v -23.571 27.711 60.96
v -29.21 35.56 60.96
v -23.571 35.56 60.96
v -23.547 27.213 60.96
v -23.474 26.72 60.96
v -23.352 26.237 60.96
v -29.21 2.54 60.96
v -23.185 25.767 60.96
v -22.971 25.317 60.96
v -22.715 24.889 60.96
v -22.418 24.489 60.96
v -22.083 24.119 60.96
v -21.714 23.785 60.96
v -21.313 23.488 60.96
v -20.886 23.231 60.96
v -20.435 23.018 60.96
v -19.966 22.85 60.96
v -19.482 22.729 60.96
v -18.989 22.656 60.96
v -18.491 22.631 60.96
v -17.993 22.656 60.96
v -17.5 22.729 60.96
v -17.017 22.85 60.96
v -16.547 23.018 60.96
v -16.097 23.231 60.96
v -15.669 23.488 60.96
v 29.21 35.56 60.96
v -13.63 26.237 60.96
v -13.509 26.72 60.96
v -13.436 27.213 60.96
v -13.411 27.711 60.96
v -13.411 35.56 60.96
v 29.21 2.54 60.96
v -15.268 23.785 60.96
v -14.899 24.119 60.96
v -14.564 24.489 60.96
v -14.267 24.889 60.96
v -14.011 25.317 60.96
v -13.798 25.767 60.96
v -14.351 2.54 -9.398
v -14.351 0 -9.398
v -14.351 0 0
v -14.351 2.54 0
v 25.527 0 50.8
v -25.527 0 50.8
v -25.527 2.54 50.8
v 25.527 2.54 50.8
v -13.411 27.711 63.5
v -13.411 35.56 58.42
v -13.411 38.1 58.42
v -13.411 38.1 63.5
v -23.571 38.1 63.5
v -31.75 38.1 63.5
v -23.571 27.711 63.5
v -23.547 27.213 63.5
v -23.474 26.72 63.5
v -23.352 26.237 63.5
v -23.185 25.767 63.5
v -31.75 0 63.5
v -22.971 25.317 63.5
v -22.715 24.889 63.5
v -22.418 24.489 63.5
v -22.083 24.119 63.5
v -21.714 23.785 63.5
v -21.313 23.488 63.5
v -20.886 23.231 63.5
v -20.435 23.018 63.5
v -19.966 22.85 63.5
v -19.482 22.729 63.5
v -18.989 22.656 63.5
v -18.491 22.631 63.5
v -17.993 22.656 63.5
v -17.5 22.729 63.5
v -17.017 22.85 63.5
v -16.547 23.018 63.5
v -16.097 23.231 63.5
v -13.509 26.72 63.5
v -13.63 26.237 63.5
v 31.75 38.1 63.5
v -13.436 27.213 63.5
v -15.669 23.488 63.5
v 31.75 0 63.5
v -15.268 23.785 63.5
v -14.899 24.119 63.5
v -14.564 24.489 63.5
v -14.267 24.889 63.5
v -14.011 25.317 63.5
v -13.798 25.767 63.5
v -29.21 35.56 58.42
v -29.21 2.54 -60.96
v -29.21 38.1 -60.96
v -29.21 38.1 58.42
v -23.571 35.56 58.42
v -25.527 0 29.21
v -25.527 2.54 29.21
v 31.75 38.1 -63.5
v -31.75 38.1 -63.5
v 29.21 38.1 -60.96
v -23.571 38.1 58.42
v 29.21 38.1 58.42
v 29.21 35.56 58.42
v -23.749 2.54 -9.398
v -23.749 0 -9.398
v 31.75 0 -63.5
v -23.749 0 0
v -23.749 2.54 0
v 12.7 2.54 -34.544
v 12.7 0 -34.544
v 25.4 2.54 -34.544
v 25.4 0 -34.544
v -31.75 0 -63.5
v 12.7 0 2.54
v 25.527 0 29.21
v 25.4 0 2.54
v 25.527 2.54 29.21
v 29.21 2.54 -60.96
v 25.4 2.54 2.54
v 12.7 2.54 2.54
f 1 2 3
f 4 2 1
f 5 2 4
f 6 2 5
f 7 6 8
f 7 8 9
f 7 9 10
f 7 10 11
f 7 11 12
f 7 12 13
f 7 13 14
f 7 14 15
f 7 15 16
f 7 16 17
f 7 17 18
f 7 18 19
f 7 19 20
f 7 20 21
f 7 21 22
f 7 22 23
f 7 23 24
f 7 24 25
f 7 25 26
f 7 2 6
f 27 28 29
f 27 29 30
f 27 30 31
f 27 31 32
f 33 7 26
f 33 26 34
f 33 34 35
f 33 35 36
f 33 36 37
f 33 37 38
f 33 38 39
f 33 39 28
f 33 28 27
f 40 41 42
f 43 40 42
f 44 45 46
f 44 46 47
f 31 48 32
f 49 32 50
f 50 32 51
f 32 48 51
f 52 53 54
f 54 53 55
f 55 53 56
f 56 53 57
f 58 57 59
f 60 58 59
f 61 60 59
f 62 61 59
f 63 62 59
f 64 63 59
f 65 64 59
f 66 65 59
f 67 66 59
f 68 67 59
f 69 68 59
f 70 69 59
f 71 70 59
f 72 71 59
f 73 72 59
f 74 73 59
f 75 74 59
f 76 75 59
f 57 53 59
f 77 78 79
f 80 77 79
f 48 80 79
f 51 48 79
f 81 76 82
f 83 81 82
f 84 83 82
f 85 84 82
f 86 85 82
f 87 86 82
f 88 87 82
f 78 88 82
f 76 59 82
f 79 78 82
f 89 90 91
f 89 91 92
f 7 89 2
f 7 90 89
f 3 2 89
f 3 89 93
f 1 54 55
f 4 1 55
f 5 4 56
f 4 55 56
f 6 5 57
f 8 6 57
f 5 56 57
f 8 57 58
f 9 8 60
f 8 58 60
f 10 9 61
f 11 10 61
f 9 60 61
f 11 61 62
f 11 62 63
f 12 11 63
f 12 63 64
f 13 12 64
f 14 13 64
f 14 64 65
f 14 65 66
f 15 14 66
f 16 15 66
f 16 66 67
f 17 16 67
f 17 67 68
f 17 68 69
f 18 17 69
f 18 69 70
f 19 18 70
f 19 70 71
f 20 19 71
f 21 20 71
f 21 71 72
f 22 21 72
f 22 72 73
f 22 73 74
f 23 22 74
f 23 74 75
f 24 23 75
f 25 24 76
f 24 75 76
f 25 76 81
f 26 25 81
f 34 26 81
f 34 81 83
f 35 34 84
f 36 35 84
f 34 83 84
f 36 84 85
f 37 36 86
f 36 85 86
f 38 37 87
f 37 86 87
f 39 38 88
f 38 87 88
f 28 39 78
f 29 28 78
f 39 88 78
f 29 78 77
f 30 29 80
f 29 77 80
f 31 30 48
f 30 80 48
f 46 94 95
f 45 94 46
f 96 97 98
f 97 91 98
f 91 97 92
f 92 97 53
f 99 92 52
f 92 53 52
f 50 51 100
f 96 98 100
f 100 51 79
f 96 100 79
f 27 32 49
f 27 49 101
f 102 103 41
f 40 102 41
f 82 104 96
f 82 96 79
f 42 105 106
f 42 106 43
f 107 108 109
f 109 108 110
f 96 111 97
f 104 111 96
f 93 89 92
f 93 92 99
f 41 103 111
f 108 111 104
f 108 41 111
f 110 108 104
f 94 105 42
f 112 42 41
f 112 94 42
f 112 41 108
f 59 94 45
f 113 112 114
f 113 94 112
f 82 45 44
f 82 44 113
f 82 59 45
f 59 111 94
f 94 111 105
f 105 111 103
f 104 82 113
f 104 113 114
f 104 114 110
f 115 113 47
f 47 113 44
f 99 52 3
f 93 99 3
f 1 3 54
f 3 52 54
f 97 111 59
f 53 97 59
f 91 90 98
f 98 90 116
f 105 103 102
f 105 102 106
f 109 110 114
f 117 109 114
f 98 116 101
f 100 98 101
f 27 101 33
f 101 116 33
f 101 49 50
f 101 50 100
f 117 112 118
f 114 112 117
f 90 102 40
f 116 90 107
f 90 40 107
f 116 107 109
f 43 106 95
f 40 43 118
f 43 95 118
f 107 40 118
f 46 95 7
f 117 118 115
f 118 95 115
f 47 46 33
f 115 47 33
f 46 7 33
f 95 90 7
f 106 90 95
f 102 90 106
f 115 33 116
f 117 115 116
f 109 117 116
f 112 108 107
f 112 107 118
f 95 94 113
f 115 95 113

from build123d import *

# Parameters (mm, degrees)
F0_W     = 63.5
F0_H     = 127
F0_W_2   = 58.42
F0_H_2   = 121.92
F0_W_3   = 9.398
F0_H_3   = 9.398
F0_W_4   = 12.7
F0_H_4   = 37.084
F0_W_5   = 51.054
F0_H_5   = 21.59
F1_DEPTH = 2.54
F2_DEPTH = 38.1
F3_W     = 58.42
F3_H     = 2.54
F4_DEPTH = 2.54
F6_DEPTH = 12.0904


with BuildPart() as f1:
    # F0 (on Front) → F1 (new body)
    with BuildSketch(Plane.XZ):
        Rectangle(F0_W, F0_H)
        Rectangle(F0_W_2, F0_H_2, mode=Mode.SUBTRACT)
        Rectangle(F0_W_2, F0_H_2)
        with Locations((-19.05, -4.699)):
            Rectangle(F0_W_3, F0_H_3, mode=Mode.SUBTRACT)
        with Locations((19.05, -16.002)):
            Rectangle(F0_W_4, F0_H_4, mode=Mode.SUBTRACT)
        with Locations((0, 40.005)):
            Rectangle(F0_W_5, F0_H_5, mode=Mode.SUBTRACT)
    extrude(amount=-F1_DEPTH)

    # F0 (on Front) → F2 (join)
    with BuildSketch(Plane.XZ):
        Rectangle(F0_W, F0_H)
        Rectangle(F0_W_2, F0_H_2, mode=Mode.SUBTRACT)
    extrude(amount=-F2_DEPTH)

    # F3 (on face) → F4 (join)
    with BuildSketch(Plane(origin=(0, 0, 60.96), x_dir=(1, 0, 0), z_dir=(0, 0, -1))):
        with Locations((0, -36.83)):
            Rectangle(F3_W, F3_H)
    extrude(amount=F4_DEPTH)

    # F5 (on face) → F6 (cut)
    with BuildSketch(Plane.XY.offset(63.5)):
        with BuildLine():
            ThreePointArc((-23.5712, 27.7114), (-18.4912, 22.6314), (-13.4112, 27.7114))
            ThreePointArc((-13.4112, 27.7114), (-18.4912, 32.7914), (-23.5712, 27.7114))
        make_face()
        with BuildLine():
            ThreePointArc((-23.5712, 27.7114), (-18.4912, 32.7914), (-13.4112, 27.7114))
            Line((-13.4112, 27.7114), (-13.4112, 38.1))
            Line((-13.4112, 38.1), (-23.5712, 38.1))
            Line((-23.5712, 38.1), (-23.5712, 27.7114))
        make_face()
    extrude(amount=-F6_DEPTH, mode=Mode.SUBTRACT)


solid = f1.part
